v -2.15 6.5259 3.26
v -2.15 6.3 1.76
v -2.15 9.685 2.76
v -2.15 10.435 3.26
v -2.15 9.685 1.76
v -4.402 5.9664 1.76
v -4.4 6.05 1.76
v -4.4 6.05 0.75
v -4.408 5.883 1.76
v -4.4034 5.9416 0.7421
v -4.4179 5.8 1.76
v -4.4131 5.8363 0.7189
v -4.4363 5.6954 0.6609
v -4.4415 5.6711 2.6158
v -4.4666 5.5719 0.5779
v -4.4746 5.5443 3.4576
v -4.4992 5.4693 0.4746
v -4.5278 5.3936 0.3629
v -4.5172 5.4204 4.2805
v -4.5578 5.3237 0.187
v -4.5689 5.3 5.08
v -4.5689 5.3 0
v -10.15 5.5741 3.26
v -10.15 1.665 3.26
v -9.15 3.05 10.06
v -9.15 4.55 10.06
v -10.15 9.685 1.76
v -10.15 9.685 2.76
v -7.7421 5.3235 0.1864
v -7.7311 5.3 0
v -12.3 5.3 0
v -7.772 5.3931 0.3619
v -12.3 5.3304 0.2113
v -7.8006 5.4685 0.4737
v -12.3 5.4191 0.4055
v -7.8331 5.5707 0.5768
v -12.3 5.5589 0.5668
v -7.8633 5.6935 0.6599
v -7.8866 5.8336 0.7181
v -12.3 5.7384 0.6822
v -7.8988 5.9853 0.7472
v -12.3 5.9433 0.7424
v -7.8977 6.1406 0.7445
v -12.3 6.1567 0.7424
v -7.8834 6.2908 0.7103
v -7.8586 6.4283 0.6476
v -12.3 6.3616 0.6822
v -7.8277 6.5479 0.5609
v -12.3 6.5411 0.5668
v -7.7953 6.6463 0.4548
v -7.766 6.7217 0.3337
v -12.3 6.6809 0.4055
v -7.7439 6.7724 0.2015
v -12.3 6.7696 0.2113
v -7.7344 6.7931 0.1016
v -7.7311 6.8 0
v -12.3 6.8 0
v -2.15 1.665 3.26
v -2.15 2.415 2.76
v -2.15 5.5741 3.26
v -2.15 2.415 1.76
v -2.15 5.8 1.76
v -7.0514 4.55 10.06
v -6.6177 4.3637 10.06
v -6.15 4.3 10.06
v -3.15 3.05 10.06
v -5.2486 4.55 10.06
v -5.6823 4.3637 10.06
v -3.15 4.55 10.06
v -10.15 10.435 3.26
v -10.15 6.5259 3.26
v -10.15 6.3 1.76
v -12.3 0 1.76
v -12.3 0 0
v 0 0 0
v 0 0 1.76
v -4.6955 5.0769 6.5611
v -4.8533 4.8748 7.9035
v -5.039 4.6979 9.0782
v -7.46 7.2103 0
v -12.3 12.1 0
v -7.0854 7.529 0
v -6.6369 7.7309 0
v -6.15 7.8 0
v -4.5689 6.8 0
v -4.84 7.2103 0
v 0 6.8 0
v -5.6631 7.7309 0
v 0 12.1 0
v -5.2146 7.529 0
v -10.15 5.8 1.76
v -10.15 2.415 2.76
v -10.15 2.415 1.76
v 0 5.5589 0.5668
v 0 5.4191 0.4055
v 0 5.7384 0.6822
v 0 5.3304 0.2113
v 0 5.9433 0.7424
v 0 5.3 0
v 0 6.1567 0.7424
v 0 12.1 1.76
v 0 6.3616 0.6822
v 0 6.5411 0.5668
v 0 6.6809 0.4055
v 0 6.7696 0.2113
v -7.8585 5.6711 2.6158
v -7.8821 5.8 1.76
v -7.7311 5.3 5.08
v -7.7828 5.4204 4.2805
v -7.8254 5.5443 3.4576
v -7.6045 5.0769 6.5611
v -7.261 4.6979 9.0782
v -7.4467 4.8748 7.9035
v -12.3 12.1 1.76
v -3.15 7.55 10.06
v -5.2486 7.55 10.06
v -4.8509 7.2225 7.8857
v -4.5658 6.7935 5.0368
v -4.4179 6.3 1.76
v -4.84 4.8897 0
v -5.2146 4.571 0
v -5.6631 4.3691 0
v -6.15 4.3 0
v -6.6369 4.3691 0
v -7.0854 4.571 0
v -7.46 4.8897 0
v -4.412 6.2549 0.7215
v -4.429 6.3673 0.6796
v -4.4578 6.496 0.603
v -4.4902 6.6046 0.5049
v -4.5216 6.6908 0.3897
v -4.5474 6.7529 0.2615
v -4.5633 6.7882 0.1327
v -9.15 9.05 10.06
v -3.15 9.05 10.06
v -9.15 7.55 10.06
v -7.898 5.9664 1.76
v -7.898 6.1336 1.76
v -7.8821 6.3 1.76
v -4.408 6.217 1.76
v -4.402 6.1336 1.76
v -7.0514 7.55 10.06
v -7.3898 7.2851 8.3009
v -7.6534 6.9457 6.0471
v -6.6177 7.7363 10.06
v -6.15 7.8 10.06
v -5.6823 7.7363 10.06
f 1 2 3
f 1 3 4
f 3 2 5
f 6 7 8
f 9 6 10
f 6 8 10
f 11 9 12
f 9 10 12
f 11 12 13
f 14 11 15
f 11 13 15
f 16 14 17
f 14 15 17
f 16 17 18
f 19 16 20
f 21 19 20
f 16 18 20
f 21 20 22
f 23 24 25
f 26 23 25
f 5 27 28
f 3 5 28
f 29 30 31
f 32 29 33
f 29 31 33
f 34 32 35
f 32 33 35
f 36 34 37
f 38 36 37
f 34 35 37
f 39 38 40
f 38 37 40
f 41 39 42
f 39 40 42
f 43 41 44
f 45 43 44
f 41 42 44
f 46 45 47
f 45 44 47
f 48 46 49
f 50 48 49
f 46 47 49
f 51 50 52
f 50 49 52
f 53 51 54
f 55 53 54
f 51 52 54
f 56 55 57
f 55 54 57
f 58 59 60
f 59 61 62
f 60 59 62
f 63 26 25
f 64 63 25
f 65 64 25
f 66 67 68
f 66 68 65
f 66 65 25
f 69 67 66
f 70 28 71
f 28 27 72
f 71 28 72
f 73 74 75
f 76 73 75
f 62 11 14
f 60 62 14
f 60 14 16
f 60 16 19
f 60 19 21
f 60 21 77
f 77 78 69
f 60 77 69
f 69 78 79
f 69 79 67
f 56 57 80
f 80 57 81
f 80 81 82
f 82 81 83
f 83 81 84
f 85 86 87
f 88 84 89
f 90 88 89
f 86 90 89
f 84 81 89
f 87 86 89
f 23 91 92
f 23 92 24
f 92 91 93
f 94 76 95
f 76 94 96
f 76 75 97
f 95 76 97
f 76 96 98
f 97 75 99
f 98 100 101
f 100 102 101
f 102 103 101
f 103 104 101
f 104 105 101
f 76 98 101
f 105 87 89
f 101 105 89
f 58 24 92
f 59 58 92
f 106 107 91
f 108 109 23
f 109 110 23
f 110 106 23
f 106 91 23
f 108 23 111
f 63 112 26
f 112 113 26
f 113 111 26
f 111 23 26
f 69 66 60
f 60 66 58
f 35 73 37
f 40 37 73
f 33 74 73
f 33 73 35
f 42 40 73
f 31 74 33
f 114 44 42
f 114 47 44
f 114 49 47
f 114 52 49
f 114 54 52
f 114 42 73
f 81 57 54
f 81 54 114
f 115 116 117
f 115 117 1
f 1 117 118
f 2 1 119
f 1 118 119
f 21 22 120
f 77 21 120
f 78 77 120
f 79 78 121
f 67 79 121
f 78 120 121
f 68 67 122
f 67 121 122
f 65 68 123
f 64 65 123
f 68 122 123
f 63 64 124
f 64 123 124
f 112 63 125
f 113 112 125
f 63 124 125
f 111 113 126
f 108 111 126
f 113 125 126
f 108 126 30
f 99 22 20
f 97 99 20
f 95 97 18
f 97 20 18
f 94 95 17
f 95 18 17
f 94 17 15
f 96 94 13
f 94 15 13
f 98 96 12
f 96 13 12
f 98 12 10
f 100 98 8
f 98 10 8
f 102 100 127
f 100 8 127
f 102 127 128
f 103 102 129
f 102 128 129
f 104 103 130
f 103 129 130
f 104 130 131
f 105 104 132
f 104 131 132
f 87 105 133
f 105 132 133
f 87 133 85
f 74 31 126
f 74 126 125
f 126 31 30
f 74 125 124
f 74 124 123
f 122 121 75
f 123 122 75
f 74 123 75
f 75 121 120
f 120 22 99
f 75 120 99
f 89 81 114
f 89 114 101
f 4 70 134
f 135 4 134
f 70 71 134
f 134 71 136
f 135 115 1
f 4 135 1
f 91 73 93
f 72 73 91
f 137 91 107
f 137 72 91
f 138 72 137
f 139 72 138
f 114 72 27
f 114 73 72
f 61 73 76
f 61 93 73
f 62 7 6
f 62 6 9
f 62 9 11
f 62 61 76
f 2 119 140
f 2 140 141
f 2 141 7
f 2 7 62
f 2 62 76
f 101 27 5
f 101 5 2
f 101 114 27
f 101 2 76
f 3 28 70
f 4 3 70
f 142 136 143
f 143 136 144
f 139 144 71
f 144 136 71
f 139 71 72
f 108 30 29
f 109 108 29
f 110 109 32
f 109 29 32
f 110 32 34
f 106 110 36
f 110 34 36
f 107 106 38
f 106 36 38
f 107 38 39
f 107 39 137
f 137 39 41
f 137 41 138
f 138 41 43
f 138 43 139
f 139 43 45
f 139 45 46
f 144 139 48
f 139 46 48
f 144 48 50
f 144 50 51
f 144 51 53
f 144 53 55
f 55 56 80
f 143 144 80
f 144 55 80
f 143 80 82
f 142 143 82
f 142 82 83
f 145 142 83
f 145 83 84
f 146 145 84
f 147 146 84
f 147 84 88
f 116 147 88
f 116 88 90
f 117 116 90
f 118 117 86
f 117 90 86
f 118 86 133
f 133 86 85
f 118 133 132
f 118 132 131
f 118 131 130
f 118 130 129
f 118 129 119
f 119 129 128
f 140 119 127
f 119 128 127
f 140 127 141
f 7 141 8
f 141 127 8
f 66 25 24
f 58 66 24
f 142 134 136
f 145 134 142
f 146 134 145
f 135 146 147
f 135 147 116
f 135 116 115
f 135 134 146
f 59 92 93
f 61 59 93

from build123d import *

# Parameters (mm, degrees)
F0_W      = 12.3
F0_H      = 12.1
F1_DEPTH  = 1.76
F2_W      = 8
F2_H      = 0.45
F2_H_2    = 7.8699186992
F3_DEPTH  = 8.3
F5_DEPTH  = 10.151
F7_DEPTH  = 12.101
F9_DEPTH  = 12.301
F11_DEPTH = 10.061


with BuildPart() as f1:
    # F0 (on Top) → F1 (new body)
    with BuildSketch(Plane.XY):
        with Locations((-6.15, 6.05)):
            Rectangle(F0_W, F0_H)
    extrude(amount=F1_DEPTH)

    # F2 (on face) → F3 (join)
    with BuildSketch(Plane.XY.offset(1.76)):
        with Locations((-6.15, 10.2099593496)):
            Rectangle(F2_W, F2_H)
        with Locations((-6.15, 6.05)):
            Rectangle(F2_W, F2_H_2)
        with Locations((-6.15, 1.8900406504)):
            Rectangle(F2_W, F2_H)
    extrude(amount=F3_DEPTH)

    # F4 (on face) → F5 (cut, through all)
    with BuildSketch(Plane(origin=(-10.15, 0, 0), x_dir=(0, -1, 0), z_dir=(-1, 0, 0))):
        Polygon((-10.4349593496, 3.26), (-9.05, 10.06), (-10.4349593496, 10.06), align=None)
        Polygon((-4.55, 10.06), (-7.55, 10.06), (-6.3, 1.76), (-5.8, 1.76), align=None)
        Polygon((-1.6650406504, 10.06), (-3.05, 10.06), (-1.6650406504, 3.26), align=None)
        Polygon((-10.4349593496, 1.76), (-9.6849593496, 1.76), (-9.6849593496, 2.76), (-10.4349593496, 3.26), align=None)
        Polygon((-2.4150406504, 2.76), (-2.4150406504, 1.76), (-1.6650406504, 1.76), (-1.6650406504, 3.26), align=None)
    extrude(amount=-F5_DEPTH, mode=Mode.SUBTRACT)

    # F6 (on Front) → F7 (cut, through all)
    with BuildSketch(Plane.XZ):
        Polygon((-10.15, 10.06), (-10.15, 3.26), (-9.15, 10.06), align=None)
        Polygon((-3.15, 10.06), (-2.15, 3.26), (-2.15, 10.06), align=None)
    extrude(amount=-F7_DEPTH, mode=Mode.SUBTRACT)

    # F8 (on face) → F9 (cut, through all)
    with BuildSketch(Plane(origin=(-12.3, 0, 0), x_dir=(0, -1, 0), z_dir=(-1, 0, 0))):
        with BuildLine():
            ThreePointArc((-6.8, 0), (-6.05, -0.75), (-5.3, 0))
            Line((-5.3, 0), (-6.8, 0))
        make_face()
        with BuildLine():
            Line((-6.8, 0), (-5.3, 0))
            ThreePointArc((-5.3, 0), (-6.05, 0.75), (-6.8, 0))
        make_face()
    extrude(amount=-F9_DEPTH, mode=Mode.SUBTRACT)

    # F10 (on face) → F11 (cut, through all)
    with BuildSketch(Plane(origin=(0, 0, 0), x_dir=(1, 0, 0), z_dir=(0, 0, -1))):
        with BuildLine():
            ThreePointArc((-7.7311388301, -5.3), (-6.5343872054, -7.7572628609), (-4.4, -6.05))
            ThreePointArc((-4.4, -6.05), (-4.4427371391, -5.6656127946), (-4.5688611699, -5.3))
            Line((-4.5688611699, -5.3), (-7.7311388301, -5.3))
        make_face()
        with BuildLine():
            Line((-7.7311388301, -5.3), (-4.5688611699, -5.3))
            ThreePointArc((-4.5688611699, -5.3), (-6.15, -4.3), (-7.7311388301, -5.3))
        make_face()
    extrude(amount=-F11_DEPTH, mode=Mode.SUBTRACT)


solid = f1.part
